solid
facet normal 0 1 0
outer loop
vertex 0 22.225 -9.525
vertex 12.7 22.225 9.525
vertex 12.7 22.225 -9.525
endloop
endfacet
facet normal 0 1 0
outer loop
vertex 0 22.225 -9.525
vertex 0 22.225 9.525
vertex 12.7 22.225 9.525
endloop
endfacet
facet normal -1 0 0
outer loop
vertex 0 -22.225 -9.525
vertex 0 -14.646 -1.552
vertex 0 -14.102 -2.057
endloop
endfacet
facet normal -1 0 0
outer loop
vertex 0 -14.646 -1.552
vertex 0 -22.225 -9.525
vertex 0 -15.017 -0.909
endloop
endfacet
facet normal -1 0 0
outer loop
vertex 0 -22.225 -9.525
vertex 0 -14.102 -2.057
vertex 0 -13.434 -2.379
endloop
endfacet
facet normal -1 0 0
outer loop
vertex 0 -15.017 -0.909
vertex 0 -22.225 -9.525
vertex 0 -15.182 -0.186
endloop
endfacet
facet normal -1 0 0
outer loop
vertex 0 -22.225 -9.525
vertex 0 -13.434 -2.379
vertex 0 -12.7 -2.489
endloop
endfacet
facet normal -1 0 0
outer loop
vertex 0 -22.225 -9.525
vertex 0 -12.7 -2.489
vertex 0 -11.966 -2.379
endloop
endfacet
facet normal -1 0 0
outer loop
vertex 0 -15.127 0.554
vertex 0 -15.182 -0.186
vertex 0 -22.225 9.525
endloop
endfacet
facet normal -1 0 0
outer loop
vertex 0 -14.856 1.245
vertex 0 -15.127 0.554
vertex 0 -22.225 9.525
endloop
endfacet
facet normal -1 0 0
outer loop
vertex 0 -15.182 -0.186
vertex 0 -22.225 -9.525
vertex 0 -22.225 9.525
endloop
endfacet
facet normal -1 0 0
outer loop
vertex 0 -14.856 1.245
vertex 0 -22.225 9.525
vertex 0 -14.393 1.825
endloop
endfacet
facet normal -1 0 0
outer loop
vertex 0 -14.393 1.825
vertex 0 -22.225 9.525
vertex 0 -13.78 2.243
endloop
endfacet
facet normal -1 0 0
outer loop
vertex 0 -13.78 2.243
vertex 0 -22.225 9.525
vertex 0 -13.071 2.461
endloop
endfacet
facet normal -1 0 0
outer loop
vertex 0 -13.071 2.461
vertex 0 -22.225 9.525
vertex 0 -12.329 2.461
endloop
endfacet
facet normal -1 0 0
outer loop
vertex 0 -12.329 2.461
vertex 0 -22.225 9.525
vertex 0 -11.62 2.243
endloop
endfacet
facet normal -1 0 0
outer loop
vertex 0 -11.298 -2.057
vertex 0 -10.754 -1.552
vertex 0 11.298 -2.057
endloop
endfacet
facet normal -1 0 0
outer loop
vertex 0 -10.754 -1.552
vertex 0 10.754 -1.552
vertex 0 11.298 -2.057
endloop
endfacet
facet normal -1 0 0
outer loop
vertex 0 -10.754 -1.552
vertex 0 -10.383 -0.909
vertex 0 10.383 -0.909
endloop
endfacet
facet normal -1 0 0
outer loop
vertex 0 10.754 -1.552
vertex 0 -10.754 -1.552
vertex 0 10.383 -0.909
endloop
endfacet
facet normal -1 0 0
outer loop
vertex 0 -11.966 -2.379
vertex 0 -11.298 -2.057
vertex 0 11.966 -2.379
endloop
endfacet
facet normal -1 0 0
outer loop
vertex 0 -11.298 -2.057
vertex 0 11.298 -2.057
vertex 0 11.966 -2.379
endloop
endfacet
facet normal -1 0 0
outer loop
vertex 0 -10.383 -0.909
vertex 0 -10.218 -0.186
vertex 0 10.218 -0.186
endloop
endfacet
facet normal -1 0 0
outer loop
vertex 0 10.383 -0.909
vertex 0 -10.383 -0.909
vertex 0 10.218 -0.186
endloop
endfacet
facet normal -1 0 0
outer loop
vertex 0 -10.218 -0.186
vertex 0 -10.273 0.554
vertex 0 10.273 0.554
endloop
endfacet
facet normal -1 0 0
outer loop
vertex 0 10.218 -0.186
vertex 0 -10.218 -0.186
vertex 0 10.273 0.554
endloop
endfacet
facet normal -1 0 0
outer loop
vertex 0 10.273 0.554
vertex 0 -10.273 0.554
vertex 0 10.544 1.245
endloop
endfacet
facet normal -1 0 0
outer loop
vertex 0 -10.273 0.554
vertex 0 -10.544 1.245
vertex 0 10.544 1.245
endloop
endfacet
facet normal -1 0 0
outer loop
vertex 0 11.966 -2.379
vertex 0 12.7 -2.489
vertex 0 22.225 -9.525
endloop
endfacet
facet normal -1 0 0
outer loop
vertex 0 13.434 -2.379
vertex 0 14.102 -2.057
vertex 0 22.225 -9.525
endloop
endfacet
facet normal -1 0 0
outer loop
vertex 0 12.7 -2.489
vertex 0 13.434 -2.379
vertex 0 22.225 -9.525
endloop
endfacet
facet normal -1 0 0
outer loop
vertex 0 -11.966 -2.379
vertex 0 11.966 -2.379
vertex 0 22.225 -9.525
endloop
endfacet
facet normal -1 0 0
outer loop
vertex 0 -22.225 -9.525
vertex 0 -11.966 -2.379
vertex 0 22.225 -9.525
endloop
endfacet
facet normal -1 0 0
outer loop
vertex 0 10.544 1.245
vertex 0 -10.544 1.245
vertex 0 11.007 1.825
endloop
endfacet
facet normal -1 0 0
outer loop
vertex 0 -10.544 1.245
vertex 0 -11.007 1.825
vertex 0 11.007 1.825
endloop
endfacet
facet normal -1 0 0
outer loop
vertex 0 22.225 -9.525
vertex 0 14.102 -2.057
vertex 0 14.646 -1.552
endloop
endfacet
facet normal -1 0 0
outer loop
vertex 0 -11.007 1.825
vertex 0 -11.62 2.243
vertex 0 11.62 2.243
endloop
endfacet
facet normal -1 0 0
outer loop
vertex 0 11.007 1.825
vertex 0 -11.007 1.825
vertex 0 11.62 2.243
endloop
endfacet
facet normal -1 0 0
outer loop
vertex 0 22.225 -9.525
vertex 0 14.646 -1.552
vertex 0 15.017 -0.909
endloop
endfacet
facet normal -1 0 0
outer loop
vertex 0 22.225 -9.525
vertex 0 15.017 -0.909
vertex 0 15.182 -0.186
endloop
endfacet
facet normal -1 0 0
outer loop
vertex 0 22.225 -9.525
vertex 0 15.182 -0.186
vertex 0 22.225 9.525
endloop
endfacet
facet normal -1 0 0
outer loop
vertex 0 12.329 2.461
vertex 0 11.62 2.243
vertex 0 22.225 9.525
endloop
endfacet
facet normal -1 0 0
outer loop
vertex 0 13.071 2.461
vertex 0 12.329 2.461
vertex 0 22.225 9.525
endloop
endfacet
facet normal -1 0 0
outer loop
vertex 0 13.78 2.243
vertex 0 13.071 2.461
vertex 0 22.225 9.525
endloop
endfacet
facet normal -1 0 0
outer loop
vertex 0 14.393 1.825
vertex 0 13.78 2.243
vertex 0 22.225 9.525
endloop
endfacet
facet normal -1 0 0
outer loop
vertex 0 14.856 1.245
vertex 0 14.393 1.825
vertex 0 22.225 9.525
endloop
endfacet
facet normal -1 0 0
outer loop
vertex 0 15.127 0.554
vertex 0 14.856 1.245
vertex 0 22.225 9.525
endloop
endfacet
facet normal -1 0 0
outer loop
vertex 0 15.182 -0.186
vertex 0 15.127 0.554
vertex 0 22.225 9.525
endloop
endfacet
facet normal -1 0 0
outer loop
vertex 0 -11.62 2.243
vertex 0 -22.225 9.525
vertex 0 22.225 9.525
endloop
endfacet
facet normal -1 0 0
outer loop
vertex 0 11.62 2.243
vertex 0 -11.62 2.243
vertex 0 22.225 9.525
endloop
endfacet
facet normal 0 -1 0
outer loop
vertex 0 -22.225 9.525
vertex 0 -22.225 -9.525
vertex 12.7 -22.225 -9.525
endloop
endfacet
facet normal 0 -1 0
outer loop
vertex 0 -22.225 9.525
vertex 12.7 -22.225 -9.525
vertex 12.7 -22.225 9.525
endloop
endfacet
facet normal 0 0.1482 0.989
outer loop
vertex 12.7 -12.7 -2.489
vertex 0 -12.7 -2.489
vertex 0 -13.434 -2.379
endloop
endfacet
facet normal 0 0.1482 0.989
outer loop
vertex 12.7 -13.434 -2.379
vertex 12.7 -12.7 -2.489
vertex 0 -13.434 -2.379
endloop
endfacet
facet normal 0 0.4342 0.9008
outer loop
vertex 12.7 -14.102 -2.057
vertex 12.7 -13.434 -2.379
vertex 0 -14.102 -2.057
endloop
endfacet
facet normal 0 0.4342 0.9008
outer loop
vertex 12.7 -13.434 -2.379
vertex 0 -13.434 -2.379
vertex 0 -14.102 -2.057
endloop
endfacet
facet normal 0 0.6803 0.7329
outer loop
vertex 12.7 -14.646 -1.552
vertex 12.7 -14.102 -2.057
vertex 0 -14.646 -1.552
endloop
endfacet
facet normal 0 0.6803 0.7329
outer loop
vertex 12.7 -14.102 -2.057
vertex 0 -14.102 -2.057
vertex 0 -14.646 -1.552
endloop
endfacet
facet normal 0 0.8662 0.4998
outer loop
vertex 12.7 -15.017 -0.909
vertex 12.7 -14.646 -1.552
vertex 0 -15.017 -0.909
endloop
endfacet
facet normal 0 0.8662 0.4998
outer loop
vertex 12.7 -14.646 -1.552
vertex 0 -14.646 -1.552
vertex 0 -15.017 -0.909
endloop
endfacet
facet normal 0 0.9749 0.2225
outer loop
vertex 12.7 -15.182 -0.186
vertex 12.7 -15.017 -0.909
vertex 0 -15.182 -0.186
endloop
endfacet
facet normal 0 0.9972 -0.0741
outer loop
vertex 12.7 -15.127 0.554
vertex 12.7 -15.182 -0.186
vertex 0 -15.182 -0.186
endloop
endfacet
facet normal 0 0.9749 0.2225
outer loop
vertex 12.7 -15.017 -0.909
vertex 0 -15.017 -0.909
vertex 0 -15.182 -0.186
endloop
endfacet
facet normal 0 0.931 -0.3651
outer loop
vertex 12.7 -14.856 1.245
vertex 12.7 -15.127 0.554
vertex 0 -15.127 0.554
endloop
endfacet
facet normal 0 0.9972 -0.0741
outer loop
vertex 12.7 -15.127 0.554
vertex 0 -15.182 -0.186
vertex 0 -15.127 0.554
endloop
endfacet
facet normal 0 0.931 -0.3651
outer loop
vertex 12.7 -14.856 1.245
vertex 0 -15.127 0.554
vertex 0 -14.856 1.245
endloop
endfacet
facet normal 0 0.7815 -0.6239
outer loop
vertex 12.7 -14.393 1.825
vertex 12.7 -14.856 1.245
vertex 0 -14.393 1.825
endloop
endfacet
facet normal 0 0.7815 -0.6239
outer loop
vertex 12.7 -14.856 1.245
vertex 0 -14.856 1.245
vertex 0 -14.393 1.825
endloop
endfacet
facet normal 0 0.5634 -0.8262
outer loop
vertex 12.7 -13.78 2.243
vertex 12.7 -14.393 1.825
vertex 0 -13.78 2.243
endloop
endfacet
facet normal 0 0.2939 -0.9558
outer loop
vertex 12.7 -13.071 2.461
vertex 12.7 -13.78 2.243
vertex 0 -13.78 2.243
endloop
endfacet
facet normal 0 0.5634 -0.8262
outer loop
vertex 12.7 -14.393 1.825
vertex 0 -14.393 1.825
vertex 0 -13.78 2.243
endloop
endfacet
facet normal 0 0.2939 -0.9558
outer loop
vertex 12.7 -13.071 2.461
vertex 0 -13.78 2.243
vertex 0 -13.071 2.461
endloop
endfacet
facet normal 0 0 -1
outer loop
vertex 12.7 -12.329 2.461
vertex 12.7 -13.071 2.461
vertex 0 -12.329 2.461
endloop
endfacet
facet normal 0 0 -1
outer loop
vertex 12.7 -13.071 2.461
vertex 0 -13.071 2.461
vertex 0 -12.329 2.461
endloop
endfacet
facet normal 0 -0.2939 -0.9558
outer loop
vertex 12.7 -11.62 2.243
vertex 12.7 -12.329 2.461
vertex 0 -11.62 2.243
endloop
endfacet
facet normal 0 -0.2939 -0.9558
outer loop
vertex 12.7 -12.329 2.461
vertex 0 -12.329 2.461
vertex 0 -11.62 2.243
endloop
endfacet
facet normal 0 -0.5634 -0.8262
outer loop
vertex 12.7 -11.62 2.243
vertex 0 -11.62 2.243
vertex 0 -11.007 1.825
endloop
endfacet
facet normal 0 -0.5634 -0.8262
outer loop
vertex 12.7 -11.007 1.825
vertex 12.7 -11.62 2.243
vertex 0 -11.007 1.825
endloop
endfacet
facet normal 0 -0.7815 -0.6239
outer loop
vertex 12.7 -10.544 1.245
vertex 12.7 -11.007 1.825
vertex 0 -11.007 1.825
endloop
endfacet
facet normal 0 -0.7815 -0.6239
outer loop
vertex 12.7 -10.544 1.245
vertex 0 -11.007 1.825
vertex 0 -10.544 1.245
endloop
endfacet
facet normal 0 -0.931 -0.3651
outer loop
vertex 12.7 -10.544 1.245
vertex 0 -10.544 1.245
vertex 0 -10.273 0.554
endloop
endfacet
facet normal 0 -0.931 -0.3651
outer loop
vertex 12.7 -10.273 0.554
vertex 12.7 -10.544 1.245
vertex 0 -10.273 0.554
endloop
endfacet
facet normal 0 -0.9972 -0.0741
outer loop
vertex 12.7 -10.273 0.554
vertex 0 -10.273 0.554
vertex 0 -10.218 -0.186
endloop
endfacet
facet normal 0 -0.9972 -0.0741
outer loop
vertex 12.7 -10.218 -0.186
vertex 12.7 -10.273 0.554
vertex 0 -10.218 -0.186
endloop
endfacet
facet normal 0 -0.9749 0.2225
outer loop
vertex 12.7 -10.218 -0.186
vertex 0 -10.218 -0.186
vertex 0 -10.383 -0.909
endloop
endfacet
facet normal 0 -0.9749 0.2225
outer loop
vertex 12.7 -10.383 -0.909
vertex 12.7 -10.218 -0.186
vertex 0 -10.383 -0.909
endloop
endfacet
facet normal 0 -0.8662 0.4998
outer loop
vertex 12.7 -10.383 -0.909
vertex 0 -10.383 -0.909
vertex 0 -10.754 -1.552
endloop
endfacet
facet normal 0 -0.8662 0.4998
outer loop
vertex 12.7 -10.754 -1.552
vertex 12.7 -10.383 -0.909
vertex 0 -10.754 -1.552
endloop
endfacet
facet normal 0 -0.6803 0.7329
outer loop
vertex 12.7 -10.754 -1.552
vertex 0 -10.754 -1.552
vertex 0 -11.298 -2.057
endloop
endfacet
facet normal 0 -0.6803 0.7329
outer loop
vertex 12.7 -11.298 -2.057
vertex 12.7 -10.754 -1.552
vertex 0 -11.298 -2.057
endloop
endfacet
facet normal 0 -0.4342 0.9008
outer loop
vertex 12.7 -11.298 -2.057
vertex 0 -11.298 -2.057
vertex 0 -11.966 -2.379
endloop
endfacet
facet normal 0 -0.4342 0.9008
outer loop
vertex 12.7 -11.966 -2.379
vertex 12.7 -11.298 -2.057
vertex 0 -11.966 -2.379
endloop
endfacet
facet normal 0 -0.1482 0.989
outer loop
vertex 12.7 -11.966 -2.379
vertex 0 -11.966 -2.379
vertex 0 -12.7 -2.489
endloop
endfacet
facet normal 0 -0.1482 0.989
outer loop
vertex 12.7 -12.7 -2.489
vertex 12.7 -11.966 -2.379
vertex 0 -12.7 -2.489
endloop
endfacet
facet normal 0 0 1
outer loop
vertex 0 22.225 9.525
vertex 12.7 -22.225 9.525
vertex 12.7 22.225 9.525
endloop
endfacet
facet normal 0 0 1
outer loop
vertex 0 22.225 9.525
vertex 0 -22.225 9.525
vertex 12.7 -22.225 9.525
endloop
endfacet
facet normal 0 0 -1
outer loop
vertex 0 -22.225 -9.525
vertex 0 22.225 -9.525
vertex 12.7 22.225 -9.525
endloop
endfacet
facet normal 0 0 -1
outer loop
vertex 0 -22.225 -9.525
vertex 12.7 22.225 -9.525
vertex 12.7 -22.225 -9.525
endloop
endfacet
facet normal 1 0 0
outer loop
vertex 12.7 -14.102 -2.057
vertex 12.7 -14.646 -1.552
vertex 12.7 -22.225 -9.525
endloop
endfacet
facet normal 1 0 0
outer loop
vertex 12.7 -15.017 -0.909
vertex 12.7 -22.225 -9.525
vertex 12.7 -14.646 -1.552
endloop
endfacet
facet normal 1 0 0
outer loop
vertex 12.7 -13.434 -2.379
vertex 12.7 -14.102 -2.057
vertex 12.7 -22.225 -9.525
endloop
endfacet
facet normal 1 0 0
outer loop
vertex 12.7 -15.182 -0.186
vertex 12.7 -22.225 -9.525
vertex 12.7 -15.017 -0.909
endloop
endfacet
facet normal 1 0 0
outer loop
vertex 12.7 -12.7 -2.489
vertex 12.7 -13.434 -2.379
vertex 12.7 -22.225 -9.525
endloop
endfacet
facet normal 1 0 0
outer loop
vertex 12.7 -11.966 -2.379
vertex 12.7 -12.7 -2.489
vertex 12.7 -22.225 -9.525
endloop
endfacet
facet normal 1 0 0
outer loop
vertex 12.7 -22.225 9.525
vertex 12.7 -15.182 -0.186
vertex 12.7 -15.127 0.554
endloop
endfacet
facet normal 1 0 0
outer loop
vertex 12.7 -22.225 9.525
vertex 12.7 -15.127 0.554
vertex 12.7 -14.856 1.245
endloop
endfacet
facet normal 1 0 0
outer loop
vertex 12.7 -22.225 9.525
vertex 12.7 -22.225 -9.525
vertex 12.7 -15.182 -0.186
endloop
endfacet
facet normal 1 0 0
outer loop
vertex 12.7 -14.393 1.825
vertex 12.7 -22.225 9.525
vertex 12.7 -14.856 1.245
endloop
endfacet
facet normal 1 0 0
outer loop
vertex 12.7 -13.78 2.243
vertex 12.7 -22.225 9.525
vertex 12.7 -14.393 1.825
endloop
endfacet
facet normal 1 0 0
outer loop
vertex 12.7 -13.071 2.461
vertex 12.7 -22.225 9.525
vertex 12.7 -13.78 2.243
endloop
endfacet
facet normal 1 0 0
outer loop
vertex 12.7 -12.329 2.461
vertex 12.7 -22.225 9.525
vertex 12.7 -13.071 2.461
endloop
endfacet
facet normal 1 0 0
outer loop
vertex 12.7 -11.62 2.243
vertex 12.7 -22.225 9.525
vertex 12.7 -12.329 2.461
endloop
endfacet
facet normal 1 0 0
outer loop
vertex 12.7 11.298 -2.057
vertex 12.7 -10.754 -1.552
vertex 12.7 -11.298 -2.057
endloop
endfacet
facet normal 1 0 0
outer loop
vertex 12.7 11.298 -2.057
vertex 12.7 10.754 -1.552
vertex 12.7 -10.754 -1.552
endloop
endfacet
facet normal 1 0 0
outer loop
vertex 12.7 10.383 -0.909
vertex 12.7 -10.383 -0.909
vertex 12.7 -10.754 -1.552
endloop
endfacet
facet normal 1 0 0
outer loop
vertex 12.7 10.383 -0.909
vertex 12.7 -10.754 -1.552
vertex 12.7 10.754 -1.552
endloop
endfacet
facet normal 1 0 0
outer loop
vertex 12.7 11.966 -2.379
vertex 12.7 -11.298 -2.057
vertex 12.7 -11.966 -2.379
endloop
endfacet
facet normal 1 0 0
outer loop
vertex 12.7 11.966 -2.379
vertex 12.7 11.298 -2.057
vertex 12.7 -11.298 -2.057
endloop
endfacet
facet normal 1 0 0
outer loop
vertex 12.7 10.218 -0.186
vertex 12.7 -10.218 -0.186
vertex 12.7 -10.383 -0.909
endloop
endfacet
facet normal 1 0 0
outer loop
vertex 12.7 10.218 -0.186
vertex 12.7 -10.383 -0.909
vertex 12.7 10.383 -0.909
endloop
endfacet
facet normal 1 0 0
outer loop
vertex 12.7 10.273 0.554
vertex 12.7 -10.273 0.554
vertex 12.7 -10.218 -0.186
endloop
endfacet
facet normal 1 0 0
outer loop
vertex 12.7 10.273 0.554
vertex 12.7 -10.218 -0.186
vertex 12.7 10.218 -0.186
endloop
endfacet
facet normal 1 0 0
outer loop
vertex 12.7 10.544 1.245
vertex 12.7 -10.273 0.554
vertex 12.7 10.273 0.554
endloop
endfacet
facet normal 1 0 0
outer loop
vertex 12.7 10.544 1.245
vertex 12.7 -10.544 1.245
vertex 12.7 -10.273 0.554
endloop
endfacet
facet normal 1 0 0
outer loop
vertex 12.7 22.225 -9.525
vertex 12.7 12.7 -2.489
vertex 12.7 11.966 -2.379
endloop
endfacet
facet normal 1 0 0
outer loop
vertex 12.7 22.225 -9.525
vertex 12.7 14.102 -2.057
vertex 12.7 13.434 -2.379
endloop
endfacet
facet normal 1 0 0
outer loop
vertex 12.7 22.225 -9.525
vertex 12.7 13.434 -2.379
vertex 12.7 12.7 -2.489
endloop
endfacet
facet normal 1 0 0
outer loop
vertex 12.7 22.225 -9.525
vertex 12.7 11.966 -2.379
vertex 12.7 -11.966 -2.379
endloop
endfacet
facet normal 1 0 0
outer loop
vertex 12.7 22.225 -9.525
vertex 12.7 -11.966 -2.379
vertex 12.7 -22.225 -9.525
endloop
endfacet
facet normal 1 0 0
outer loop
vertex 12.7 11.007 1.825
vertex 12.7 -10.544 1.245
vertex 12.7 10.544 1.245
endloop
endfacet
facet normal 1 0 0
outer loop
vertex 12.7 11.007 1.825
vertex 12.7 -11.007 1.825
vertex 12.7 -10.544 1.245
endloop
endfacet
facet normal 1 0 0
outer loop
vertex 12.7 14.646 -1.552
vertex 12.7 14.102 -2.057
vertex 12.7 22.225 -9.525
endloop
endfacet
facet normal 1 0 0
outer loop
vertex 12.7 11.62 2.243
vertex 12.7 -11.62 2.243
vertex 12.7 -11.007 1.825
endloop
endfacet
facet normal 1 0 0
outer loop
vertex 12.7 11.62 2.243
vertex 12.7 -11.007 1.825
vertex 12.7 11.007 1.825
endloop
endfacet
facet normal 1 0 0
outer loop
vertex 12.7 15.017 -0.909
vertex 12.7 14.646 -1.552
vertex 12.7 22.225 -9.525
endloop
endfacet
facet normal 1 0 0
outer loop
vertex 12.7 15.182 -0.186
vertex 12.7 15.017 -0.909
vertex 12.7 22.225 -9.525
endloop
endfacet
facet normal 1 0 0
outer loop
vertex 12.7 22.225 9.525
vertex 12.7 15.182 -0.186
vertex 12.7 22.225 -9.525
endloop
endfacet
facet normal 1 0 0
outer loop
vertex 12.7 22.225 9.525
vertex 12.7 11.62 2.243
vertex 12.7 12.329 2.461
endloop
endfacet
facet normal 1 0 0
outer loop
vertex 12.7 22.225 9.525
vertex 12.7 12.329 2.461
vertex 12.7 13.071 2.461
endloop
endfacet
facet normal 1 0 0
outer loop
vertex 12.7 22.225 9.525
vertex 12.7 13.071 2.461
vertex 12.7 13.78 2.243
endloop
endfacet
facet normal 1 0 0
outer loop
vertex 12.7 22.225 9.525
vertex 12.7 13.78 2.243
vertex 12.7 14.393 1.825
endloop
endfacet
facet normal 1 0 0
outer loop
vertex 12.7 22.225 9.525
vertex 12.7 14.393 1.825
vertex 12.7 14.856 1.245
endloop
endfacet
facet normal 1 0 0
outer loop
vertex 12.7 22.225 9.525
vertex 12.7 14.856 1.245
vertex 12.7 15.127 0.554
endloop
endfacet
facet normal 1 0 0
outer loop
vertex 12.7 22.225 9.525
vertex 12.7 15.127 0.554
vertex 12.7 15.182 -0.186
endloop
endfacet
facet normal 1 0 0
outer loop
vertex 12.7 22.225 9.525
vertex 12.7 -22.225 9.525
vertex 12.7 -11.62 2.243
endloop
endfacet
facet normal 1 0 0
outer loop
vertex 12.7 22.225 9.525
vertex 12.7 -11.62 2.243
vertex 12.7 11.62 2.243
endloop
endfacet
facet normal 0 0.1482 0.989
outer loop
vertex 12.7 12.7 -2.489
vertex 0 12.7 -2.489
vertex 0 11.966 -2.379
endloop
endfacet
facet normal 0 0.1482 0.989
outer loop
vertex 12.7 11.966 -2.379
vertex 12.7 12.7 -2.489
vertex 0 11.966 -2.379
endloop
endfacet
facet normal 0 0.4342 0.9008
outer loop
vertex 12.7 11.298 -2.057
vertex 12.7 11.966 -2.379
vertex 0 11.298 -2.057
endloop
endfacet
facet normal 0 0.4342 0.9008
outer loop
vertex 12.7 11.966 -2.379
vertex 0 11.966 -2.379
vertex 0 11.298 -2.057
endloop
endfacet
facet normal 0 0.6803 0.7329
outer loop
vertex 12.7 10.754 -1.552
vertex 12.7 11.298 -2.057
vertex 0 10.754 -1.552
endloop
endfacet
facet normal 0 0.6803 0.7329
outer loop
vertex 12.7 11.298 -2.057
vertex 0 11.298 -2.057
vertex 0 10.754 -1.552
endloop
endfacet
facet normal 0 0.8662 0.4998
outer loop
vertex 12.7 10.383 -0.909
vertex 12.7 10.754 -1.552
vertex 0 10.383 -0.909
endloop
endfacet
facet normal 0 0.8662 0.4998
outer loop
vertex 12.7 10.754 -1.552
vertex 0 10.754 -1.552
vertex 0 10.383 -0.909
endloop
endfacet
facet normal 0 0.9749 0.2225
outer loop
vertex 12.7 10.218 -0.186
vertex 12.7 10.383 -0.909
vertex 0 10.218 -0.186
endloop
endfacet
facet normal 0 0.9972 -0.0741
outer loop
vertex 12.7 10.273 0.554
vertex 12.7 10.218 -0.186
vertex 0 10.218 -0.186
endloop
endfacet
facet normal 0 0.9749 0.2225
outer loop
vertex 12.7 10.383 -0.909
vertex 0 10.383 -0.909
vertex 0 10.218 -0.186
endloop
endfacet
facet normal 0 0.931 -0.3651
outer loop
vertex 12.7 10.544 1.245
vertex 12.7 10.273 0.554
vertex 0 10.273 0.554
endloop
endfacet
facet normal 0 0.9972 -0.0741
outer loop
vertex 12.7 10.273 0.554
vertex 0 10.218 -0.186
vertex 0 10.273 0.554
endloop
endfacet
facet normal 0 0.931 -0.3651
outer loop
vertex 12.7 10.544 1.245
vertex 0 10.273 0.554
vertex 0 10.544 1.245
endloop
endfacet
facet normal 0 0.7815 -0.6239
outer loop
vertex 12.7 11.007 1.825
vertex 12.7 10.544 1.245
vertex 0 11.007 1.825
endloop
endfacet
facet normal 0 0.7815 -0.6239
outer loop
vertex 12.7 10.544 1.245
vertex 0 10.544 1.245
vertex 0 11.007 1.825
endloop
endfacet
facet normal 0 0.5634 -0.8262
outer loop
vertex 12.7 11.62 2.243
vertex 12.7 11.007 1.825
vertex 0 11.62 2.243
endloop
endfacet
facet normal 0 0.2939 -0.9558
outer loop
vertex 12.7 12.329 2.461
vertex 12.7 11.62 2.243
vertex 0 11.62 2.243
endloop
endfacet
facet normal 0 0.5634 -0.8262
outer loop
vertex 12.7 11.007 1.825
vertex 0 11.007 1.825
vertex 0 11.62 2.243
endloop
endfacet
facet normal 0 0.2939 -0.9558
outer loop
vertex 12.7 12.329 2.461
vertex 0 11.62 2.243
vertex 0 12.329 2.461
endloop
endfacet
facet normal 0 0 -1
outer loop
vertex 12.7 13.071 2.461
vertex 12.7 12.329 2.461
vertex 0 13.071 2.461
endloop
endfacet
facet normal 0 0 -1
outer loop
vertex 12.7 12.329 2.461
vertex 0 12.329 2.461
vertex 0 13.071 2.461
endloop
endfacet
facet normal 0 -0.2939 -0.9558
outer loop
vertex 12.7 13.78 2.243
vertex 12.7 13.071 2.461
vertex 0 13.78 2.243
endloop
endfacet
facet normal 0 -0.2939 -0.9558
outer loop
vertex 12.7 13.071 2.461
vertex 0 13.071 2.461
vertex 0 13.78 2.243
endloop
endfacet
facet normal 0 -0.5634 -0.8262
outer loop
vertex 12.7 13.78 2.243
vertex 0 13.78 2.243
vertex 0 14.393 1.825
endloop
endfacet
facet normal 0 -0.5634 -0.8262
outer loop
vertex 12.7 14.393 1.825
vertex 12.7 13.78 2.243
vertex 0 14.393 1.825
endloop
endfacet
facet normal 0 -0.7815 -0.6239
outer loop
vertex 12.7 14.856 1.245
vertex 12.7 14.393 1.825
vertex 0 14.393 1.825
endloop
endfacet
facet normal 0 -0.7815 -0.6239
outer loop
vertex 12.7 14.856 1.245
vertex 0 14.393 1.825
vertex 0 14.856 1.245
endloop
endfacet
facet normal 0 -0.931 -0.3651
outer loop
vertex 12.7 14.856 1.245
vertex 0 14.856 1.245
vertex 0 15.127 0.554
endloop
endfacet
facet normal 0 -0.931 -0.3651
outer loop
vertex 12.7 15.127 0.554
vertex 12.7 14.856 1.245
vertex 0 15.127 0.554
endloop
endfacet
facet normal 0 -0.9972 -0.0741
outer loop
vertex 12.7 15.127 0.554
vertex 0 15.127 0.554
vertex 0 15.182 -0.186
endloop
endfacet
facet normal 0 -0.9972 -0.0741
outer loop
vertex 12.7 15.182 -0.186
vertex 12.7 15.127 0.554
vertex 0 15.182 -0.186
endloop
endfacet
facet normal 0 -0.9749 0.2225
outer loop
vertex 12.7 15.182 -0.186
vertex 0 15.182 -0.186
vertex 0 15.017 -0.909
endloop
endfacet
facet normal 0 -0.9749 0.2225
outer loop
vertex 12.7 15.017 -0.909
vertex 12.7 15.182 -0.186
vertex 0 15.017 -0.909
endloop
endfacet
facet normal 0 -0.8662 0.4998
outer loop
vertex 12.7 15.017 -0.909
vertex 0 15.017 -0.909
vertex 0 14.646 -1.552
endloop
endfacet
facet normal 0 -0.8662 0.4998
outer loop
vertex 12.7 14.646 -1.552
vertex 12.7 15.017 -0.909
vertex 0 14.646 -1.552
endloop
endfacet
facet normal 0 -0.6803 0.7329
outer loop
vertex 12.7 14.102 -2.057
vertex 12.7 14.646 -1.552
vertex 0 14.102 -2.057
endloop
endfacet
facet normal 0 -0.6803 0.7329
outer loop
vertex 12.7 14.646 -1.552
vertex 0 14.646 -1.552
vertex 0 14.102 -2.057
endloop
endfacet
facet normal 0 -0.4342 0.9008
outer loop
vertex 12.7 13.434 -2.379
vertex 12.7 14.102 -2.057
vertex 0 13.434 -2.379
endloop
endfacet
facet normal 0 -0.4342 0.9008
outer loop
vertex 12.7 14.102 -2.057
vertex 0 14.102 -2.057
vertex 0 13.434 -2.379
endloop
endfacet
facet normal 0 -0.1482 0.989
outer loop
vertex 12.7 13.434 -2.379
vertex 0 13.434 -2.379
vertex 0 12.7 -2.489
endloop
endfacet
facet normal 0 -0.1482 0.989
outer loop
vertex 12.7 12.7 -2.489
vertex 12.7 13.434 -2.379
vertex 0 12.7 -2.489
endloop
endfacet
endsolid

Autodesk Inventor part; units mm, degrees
ref_plane "YZ Plane" through (0, 0, 0) normal (1, 0, 0) x (0, 1, 0)
ref_plane "XZ Plane" through (0, 0, 0) normal (0, 1, 0) x (-1, 0, 0)
ref_plane "XY Plane" through (0, 0, 0) normal (0, 0, 1) x (1, 0, 0)
sketch "Sketch1" plane through (0, 0, 0) normal (1, 0, 0) x (0, 1, 0)
  line L0 (-22.225, 9.525) -> (22.225, 9.525)
  line L1 (22.225, 9.525) -> (22.225, -9.525)
  line L2 (22.225, -9.525) -> (-22.225, -9.525)
  line L3 (-22.225, -9.525) -> (-22.225, 9.525)
  line L4 (-22.225, 9.525) -> (22.225, -9.525) construction
  line L5 (22.225, 9.525) -> (-22.225, -9.525) construction
  point P0 (0, 0)
  dimension "d0" = 44.45
  dimension "d1" = 19.05
extrude "Extrusion1" add sketch "Sketch1" along normal blind 12.7
sketch "Sketch2" plane through (12.7, 0, 0) normal (1, 0, 0) x (0, 0, -1)
  circle A0 centre (0, 12.7) radius 3.3782
  circle A1 centre (0, -12.7) radius 3.3782
  line L0 (-660.4, 0) -> (-660.4, 41.275)
  line L1 (-9.525, 22.225) -> (-9.525, -22.225) projected
  line L2 (-12.7, 22.225) -> (-12.7, -22.225)
  point P0 (0, 0)
  dimension "d4" = 3.175
  dimension "d5" = 12.7
hole "Hole1" at (12.7, 12.7, 0) at (12.7, -12.7, 0) direction (-1, 0, 0) diameter 4.9784 end through all thread size "1/4-20 UNC" class "2B" standard "ANSI Unified Screw Threads"
properties part number "Threaded Block" material "Aluminum 6061"
